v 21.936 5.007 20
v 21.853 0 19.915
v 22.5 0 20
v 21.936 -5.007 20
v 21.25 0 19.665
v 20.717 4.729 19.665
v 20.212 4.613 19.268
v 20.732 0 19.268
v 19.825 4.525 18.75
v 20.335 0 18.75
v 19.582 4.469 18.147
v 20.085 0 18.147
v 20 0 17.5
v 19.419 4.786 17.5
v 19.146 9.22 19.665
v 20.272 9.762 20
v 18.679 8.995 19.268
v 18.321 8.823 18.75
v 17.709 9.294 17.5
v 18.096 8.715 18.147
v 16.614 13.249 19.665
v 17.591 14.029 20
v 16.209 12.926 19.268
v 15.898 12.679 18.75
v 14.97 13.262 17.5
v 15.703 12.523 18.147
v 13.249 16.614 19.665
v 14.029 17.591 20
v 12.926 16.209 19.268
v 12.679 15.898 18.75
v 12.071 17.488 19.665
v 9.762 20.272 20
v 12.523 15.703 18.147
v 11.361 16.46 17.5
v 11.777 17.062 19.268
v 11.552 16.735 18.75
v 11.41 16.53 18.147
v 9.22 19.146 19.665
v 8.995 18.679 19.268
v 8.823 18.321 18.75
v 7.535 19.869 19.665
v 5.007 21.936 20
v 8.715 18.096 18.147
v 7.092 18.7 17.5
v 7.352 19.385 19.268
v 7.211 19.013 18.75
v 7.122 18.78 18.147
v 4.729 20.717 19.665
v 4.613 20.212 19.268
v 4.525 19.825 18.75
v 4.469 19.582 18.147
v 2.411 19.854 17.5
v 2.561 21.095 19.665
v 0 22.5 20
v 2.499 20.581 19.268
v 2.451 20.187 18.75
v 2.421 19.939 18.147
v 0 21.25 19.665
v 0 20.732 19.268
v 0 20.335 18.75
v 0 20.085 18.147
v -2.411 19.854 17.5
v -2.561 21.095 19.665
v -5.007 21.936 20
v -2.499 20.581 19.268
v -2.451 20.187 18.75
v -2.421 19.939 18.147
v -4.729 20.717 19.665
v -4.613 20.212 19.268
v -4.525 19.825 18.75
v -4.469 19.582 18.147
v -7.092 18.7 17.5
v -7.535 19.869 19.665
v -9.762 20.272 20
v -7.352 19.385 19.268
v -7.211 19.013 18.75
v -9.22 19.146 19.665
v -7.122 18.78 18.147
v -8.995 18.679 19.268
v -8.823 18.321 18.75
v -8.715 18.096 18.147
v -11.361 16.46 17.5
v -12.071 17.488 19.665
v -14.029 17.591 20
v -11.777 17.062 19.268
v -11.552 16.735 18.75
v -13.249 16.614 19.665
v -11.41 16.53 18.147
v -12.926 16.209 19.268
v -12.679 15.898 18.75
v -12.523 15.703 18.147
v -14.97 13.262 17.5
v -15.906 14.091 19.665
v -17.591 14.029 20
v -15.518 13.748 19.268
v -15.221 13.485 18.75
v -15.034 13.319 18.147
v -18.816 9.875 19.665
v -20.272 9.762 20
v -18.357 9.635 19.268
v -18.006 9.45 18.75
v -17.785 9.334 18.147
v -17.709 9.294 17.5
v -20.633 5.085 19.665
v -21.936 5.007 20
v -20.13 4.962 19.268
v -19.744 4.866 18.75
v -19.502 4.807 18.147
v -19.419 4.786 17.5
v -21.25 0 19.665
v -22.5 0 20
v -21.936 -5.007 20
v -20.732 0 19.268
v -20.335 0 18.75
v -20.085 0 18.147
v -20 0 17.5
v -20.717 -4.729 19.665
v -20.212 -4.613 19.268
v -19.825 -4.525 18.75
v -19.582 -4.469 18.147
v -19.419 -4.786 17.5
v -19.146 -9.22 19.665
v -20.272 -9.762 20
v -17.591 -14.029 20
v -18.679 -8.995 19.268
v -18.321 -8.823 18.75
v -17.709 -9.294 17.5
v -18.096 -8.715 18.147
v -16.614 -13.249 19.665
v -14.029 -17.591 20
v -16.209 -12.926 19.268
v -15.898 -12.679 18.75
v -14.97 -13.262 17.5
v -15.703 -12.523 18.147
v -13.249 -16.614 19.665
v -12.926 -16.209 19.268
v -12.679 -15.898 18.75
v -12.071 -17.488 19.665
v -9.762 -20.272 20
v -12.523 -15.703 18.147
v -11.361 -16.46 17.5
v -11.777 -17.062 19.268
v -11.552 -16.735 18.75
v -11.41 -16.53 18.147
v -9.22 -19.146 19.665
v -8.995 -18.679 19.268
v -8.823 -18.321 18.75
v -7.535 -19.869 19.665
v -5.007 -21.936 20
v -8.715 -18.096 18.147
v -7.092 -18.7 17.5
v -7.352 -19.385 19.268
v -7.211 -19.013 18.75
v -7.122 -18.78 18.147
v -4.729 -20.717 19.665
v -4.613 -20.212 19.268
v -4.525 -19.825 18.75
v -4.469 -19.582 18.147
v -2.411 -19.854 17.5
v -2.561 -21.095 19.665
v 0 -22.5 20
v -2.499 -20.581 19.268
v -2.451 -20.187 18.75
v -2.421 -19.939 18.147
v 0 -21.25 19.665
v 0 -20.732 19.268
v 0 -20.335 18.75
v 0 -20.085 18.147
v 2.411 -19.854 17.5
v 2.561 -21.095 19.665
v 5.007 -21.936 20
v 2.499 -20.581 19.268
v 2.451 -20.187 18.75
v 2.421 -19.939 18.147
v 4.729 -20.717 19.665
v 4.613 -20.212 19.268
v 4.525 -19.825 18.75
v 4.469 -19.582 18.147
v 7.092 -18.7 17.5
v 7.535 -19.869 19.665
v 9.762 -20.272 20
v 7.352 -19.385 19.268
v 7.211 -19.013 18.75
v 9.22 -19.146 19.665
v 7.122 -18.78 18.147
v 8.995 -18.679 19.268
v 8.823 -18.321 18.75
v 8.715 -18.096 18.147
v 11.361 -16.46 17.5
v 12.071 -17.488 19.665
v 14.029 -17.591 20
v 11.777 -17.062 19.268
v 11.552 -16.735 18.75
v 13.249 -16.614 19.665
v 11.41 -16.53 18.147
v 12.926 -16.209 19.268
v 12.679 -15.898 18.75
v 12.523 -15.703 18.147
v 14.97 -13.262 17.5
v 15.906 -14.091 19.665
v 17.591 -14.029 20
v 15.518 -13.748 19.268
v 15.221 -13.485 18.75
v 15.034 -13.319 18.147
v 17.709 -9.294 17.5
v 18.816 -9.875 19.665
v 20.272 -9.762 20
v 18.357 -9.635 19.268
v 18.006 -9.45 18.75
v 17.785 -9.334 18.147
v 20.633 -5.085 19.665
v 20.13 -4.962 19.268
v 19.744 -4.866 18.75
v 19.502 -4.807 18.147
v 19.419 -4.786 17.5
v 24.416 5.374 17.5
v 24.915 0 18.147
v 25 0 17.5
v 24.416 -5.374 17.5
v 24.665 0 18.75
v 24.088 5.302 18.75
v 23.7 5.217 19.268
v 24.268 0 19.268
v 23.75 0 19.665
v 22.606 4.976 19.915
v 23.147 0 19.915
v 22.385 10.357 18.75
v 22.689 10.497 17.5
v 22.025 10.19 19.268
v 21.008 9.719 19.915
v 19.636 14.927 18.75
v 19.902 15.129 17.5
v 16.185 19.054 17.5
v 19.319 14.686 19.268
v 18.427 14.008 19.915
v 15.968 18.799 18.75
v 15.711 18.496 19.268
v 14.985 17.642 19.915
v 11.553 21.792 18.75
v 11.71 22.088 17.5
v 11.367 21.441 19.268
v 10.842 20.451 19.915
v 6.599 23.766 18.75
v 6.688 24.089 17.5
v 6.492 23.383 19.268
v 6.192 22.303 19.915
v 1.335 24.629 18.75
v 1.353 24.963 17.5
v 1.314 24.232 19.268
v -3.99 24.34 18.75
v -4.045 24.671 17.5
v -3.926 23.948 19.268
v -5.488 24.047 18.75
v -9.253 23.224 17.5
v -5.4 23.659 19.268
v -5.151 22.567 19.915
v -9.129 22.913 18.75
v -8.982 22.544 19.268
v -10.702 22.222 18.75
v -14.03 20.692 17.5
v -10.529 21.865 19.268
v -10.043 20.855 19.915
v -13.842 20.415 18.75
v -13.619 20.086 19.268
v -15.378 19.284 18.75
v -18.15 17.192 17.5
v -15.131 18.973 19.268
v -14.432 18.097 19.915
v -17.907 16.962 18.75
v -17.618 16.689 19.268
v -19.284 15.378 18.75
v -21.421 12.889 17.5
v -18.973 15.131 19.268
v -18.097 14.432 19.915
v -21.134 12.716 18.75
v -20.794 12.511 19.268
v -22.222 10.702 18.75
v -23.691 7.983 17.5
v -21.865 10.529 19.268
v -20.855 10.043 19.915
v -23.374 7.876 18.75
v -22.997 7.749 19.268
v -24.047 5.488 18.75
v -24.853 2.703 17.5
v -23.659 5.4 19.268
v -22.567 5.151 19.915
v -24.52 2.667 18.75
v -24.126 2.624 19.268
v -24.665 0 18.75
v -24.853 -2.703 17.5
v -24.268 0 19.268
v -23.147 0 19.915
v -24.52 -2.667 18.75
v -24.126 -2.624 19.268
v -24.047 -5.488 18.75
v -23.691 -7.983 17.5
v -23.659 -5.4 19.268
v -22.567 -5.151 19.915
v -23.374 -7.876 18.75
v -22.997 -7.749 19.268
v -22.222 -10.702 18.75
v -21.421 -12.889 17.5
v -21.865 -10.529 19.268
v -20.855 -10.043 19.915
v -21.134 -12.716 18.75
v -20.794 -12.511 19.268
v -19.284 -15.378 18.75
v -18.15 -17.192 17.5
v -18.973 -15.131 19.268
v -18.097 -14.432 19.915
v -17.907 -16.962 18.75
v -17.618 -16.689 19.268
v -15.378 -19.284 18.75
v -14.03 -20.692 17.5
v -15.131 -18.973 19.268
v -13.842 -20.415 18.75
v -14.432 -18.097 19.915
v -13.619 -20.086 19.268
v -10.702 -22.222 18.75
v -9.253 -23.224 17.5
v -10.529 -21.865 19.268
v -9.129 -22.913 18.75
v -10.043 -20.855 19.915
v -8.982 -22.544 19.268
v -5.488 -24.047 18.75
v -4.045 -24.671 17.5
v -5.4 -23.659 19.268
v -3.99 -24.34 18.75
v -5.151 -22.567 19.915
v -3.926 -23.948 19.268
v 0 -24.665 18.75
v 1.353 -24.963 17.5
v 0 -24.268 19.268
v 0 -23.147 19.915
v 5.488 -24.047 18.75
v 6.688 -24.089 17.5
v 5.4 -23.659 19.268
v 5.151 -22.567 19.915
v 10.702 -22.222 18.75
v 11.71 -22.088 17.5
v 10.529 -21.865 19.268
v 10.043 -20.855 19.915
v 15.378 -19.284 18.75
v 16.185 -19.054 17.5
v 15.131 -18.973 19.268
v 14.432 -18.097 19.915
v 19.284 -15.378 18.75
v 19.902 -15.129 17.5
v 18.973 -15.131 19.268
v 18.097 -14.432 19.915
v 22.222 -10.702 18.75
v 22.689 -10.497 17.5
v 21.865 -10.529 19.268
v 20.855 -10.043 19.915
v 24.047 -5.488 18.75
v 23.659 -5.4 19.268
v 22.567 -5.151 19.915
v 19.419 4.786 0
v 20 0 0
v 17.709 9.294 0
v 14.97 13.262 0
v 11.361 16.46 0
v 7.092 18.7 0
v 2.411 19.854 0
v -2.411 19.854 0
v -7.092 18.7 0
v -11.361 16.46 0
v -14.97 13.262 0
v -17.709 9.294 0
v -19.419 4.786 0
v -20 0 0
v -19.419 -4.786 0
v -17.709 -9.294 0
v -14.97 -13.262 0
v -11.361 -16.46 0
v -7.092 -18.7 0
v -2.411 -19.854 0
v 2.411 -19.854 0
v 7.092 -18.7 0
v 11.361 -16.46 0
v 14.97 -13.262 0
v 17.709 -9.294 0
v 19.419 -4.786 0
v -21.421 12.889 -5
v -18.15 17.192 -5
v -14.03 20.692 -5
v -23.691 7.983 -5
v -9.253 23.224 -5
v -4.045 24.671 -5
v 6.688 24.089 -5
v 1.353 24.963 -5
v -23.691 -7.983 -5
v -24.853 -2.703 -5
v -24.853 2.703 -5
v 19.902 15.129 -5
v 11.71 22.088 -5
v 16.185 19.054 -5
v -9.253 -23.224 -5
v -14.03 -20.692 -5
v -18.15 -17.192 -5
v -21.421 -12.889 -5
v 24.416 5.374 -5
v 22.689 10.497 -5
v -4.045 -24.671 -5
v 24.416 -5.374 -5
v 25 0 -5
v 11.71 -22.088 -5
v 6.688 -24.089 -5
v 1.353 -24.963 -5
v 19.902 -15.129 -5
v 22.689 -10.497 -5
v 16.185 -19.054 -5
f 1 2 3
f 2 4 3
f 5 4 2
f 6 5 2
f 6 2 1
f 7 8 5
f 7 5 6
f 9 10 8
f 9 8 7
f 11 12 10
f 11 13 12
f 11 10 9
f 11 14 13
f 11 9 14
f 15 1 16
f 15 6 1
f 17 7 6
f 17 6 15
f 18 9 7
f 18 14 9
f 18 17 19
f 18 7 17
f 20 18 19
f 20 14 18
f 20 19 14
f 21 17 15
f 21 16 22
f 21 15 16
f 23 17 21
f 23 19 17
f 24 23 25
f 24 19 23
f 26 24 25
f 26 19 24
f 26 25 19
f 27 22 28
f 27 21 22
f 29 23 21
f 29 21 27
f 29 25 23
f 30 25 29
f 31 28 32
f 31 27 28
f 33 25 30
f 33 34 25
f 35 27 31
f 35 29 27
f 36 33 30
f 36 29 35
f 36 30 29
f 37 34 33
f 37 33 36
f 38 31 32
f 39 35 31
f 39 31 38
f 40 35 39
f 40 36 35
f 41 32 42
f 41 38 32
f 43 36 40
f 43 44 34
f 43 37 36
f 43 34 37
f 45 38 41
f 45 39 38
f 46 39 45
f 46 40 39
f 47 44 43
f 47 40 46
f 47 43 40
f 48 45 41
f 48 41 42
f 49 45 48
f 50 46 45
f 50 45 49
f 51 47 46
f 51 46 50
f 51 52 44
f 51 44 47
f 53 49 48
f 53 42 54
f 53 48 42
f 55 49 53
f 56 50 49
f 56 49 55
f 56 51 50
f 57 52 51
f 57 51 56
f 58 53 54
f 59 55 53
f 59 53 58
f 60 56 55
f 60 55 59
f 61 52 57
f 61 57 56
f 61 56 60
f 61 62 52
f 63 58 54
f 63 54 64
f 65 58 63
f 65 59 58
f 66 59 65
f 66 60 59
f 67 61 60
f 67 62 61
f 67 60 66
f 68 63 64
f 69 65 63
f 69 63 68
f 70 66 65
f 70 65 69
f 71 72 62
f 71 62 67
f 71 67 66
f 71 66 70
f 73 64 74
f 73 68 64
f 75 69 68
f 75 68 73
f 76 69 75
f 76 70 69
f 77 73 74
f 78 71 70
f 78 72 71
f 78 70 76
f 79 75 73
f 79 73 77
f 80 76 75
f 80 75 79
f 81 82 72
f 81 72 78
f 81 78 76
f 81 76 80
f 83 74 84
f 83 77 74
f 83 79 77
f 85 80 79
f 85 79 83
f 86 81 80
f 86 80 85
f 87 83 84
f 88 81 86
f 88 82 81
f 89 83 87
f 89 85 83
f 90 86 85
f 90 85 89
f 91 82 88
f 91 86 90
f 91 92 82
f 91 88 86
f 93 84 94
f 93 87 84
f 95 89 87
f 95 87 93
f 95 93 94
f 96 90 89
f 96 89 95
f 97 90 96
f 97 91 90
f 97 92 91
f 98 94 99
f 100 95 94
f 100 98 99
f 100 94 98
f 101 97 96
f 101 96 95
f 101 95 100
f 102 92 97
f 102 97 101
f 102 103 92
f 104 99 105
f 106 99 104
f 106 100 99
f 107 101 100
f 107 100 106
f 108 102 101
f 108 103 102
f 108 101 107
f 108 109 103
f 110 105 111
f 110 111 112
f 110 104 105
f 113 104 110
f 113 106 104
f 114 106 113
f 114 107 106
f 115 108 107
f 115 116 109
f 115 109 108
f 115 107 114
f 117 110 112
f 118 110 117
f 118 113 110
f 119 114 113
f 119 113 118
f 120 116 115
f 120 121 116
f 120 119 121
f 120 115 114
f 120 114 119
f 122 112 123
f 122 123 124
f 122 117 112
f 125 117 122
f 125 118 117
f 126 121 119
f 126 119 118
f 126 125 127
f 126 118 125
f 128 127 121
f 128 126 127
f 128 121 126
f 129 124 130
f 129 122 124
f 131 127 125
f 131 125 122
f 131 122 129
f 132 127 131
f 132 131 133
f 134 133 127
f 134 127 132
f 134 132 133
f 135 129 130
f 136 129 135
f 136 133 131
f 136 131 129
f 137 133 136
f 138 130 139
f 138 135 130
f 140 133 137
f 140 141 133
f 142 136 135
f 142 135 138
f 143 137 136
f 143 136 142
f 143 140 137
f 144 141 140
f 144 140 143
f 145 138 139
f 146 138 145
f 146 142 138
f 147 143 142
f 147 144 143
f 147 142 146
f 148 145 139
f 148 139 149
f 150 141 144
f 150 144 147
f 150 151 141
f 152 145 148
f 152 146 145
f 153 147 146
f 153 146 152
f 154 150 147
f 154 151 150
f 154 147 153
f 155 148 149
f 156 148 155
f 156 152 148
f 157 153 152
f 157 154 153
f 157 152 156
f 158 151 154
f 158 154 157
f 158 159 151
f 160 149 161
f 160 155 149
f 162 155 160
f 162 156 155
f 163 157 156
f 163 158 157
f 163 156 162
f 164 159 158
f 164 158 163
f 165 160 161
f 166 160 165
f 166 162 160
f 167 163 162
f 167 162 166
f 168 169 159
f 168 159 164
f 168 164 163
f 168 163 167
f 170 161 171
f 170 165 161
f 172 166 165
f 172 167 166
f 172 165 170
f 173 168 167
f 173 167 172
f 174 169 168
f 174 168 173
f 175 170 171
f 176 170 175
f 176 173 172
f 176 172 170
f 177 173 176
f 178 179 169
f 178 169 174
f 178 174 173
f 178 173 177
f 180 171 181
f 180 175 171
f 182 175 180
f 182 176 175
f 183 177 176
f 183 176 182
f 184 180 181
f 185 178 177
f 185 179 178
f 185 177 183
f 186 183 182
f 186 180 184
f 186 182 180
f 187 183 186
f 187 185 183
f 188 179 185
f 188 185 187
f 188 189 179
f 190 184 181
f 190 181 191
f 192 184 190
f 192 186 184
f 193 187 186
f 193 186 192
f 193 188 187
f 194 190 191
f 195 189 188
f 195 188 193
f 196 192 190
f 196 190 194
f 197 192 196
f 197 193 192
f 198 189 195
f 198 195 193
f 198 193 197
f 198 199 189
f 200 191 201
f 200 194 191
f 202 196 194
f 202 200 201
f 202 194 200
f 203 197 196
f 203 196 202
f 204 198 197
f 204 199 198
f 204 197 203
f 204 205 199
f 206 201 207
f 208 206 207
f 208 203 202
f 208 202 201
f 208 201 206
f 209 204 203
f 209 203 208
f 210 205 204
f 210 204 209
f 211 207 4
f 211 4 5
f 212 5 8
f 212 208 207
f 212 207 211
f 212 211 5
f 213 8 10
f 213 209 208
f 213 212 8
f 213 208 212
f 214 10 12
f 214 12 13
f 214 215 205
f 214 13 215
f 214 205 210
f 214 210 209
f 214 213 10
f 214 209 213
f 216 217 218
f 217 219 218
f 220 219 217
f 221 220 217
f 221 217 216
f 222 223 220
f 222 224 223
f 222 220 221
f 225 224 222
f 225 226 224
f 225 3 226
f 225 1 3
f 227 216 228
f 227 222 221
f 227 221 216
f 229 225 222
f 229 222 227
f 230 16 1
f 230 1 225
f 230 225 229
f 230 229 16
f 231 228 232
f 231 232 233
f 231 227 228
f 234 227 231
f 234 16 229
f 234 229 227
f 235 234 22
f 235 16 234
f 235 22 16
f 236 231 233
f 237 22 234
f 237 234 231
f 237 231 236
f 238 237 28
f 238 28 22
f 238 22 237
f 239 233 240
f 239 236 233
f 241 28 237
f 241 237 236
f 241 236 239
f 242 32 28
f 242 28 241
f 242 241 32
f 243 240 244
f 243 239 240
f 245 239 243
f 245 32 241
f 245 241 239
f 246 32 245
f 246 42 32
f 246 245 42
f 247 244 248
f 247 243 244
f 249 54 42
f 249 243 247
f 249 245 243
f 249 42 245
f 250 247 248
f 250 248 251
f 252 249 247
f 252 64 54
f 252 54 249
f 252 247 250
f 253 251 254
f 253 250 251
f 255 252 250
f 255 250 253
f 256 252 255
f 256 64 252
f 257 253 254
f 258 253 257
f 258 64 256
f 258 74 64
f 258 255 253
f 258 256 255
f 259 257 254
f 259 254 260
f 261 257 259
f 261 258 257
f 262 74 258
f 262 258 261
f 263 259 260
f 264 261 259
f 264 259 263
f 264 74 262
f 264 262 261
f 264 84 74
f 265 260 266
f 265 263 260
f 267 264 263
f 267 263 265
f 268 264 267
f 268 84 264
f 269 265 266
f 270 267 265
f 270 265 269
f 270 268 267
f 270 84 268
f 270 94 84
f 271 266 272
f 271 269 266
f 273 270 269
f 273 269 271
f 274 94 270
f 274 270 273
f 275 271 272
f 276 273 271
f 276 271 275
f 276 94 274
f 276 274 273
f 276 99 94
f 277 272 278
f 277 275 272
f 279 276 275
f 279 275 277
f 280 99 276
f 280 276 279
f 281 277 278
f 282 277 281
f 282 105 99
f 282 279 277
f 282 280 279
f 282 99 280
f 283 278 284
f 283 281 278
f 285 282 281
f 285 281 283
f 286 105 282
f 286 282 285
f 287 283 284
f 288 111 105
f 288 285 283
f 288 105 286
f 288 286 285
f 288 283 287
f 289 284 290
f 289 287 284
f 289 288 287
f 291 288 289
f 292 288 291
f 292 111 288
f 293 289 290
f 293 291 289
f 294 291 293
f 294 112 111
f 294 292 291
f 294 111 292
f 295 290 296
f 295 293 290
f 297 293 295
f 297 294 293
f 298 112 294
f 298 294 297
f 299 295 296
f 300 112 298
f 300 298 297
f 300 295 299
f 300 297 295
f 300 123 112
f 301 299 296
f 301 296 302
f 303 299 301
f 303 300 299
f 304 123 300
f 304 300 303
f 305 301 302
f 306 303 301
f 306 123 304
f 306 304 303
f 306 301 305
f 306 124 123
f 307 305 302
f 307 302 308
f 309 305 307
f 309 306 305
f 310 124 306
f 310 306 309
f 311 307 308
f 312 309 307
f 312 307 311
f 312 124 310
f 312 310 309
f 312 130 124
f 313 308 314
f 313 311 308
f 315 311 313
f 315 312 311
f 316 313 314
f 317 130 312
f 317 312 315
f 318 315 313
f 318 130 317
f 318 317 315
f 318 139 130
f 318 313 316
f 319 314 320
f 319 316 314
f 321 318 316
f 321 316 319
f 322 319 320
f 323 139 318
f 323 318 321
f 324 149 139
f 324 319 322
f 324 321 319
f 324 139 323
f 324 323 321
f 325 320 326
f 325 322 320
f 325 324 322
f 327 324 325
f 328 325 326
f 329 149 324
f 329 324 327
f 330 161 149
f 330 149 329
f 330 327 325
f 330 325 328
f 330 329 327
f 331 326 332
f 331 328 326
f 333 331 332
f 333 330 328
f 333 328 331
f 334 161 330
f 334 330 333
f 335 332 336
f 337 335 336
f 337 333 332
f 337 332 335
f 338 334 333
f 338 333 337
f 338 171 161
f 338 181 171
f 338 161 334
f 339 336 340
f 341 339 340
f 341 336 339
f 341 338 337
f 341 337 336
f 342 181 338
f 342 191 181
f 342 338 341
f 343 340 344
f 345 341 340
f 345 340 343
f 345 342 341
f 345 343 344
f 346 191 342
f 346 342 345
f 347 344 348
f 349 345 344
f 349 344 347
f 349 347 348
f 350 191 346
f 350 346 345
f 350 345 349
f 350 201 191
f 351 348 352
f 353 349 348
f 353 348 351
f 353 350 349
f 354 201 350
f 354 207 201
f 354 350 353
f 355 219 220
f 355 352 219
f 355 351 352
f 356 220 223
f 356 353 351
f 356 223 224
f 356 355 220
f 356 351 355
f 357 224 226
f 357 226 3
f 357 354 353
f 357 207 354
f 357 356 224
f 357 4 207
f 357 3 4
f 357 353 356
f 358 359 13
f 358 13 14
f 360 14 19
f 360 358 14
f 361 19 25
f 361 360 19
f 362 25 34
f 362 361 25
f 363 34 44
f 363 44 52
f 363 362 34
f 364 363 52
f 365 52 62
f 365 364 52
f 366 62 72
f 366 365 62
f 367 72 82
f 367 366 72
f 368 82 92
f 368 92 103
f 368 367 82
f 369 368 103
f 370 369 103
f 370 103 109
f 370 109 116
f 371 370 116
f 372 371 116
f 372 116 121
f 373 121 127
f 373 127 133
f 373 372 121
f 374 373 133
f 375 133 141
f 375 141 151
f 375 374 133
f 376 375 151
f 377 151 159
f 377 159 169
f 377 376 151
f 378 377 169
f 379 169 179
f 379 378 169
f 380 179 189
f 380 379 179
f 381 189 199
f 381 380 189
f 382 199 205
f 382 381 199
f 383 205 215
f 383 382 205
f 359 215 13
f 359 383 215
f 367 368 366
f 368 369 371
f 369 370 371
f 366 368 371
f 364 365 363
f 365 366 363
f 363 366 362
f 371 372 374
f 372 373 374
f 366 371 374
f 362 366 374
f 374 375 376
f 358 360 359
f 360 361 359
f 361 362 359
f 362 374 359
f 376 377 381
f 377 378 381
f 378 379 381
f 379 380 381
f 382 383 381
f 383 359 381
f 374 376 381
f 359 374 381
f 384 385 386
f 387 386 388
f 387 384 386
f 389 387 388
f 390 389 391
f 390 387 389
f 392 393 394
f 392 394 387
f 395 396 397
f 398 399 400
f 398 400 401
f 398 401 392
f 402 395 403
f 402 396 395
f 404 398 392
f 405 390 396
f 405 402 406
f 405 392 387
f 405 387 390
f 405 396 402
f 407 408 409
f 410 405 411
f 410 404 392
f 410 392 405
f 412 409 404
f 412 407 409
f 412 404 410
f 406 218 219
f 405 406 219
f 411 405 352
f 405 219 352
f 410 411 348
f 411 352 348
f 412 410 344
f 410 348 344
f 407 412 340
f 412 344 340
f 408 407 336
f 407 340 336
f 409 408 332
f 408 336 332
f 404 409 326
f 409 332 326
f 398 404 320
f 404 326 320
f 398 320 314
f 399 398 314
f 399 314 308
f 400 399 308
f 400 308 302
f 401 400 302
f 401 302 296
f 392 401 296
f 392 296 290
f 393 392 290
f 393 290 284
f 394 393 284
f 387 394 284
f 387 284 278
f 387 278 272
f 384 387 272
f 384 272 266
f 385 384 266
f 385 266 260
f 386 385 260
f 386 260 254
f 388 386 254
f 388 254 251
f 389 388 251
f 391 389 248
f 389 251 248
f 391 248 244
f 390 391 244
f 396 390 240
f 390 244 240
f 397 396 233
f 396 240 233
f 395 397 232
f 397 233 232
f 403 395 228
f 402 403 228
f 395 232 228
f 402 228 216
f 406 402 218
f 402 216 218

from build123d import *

# Parameters (mm, degrees)
F0_R     = 25
F0_R_2   = 20
F1_DEPTH = 20
F2_R     = 25
F3_DEPTH = 5
F4_R     = 2.5
F5_R     = 2.49999


# Not quite as in the source:
# - a fillet or chamfer is up to 0.001 mm smaller than in the source, because OpenCascade refuses the exact size


with BuildPart() as f1:
    # F0 (on Top) → F1 (new body)
    with BuildSketch(Plane.XY):
        Circle(F0_R)
        Circle(F0_R_2, mode=Mode.SUBTRACT)
    extrude(amount=F1_DEPTH)

    # F2 (on face) → F3 (join)
    with BuildSketch(Plane(origin=(0, 0, 0), x_dir=(1, 0, 0), z_dir=(0, 0, -1))):
        Circle(F2_R)
    extrude(amount=F3_DEPTH)

    # F4
    f4_edges = [f1.edges().sort_by_distance(p)[0] for p in [
        (-25, 0, 20),
    ]]
    fillet(f4_edges, radius=F4_R)

    # F5 (radius 2.5 in the source; OpenCascade refuses exactly that, so slightly less here)
    f5_edges = [f1.edges().sort_by_distance(p)[0] for p in [
        (-20, 0, 20),
    ]]
    fillet(f5_edges, radius=F5_R)


solid = f1.part
